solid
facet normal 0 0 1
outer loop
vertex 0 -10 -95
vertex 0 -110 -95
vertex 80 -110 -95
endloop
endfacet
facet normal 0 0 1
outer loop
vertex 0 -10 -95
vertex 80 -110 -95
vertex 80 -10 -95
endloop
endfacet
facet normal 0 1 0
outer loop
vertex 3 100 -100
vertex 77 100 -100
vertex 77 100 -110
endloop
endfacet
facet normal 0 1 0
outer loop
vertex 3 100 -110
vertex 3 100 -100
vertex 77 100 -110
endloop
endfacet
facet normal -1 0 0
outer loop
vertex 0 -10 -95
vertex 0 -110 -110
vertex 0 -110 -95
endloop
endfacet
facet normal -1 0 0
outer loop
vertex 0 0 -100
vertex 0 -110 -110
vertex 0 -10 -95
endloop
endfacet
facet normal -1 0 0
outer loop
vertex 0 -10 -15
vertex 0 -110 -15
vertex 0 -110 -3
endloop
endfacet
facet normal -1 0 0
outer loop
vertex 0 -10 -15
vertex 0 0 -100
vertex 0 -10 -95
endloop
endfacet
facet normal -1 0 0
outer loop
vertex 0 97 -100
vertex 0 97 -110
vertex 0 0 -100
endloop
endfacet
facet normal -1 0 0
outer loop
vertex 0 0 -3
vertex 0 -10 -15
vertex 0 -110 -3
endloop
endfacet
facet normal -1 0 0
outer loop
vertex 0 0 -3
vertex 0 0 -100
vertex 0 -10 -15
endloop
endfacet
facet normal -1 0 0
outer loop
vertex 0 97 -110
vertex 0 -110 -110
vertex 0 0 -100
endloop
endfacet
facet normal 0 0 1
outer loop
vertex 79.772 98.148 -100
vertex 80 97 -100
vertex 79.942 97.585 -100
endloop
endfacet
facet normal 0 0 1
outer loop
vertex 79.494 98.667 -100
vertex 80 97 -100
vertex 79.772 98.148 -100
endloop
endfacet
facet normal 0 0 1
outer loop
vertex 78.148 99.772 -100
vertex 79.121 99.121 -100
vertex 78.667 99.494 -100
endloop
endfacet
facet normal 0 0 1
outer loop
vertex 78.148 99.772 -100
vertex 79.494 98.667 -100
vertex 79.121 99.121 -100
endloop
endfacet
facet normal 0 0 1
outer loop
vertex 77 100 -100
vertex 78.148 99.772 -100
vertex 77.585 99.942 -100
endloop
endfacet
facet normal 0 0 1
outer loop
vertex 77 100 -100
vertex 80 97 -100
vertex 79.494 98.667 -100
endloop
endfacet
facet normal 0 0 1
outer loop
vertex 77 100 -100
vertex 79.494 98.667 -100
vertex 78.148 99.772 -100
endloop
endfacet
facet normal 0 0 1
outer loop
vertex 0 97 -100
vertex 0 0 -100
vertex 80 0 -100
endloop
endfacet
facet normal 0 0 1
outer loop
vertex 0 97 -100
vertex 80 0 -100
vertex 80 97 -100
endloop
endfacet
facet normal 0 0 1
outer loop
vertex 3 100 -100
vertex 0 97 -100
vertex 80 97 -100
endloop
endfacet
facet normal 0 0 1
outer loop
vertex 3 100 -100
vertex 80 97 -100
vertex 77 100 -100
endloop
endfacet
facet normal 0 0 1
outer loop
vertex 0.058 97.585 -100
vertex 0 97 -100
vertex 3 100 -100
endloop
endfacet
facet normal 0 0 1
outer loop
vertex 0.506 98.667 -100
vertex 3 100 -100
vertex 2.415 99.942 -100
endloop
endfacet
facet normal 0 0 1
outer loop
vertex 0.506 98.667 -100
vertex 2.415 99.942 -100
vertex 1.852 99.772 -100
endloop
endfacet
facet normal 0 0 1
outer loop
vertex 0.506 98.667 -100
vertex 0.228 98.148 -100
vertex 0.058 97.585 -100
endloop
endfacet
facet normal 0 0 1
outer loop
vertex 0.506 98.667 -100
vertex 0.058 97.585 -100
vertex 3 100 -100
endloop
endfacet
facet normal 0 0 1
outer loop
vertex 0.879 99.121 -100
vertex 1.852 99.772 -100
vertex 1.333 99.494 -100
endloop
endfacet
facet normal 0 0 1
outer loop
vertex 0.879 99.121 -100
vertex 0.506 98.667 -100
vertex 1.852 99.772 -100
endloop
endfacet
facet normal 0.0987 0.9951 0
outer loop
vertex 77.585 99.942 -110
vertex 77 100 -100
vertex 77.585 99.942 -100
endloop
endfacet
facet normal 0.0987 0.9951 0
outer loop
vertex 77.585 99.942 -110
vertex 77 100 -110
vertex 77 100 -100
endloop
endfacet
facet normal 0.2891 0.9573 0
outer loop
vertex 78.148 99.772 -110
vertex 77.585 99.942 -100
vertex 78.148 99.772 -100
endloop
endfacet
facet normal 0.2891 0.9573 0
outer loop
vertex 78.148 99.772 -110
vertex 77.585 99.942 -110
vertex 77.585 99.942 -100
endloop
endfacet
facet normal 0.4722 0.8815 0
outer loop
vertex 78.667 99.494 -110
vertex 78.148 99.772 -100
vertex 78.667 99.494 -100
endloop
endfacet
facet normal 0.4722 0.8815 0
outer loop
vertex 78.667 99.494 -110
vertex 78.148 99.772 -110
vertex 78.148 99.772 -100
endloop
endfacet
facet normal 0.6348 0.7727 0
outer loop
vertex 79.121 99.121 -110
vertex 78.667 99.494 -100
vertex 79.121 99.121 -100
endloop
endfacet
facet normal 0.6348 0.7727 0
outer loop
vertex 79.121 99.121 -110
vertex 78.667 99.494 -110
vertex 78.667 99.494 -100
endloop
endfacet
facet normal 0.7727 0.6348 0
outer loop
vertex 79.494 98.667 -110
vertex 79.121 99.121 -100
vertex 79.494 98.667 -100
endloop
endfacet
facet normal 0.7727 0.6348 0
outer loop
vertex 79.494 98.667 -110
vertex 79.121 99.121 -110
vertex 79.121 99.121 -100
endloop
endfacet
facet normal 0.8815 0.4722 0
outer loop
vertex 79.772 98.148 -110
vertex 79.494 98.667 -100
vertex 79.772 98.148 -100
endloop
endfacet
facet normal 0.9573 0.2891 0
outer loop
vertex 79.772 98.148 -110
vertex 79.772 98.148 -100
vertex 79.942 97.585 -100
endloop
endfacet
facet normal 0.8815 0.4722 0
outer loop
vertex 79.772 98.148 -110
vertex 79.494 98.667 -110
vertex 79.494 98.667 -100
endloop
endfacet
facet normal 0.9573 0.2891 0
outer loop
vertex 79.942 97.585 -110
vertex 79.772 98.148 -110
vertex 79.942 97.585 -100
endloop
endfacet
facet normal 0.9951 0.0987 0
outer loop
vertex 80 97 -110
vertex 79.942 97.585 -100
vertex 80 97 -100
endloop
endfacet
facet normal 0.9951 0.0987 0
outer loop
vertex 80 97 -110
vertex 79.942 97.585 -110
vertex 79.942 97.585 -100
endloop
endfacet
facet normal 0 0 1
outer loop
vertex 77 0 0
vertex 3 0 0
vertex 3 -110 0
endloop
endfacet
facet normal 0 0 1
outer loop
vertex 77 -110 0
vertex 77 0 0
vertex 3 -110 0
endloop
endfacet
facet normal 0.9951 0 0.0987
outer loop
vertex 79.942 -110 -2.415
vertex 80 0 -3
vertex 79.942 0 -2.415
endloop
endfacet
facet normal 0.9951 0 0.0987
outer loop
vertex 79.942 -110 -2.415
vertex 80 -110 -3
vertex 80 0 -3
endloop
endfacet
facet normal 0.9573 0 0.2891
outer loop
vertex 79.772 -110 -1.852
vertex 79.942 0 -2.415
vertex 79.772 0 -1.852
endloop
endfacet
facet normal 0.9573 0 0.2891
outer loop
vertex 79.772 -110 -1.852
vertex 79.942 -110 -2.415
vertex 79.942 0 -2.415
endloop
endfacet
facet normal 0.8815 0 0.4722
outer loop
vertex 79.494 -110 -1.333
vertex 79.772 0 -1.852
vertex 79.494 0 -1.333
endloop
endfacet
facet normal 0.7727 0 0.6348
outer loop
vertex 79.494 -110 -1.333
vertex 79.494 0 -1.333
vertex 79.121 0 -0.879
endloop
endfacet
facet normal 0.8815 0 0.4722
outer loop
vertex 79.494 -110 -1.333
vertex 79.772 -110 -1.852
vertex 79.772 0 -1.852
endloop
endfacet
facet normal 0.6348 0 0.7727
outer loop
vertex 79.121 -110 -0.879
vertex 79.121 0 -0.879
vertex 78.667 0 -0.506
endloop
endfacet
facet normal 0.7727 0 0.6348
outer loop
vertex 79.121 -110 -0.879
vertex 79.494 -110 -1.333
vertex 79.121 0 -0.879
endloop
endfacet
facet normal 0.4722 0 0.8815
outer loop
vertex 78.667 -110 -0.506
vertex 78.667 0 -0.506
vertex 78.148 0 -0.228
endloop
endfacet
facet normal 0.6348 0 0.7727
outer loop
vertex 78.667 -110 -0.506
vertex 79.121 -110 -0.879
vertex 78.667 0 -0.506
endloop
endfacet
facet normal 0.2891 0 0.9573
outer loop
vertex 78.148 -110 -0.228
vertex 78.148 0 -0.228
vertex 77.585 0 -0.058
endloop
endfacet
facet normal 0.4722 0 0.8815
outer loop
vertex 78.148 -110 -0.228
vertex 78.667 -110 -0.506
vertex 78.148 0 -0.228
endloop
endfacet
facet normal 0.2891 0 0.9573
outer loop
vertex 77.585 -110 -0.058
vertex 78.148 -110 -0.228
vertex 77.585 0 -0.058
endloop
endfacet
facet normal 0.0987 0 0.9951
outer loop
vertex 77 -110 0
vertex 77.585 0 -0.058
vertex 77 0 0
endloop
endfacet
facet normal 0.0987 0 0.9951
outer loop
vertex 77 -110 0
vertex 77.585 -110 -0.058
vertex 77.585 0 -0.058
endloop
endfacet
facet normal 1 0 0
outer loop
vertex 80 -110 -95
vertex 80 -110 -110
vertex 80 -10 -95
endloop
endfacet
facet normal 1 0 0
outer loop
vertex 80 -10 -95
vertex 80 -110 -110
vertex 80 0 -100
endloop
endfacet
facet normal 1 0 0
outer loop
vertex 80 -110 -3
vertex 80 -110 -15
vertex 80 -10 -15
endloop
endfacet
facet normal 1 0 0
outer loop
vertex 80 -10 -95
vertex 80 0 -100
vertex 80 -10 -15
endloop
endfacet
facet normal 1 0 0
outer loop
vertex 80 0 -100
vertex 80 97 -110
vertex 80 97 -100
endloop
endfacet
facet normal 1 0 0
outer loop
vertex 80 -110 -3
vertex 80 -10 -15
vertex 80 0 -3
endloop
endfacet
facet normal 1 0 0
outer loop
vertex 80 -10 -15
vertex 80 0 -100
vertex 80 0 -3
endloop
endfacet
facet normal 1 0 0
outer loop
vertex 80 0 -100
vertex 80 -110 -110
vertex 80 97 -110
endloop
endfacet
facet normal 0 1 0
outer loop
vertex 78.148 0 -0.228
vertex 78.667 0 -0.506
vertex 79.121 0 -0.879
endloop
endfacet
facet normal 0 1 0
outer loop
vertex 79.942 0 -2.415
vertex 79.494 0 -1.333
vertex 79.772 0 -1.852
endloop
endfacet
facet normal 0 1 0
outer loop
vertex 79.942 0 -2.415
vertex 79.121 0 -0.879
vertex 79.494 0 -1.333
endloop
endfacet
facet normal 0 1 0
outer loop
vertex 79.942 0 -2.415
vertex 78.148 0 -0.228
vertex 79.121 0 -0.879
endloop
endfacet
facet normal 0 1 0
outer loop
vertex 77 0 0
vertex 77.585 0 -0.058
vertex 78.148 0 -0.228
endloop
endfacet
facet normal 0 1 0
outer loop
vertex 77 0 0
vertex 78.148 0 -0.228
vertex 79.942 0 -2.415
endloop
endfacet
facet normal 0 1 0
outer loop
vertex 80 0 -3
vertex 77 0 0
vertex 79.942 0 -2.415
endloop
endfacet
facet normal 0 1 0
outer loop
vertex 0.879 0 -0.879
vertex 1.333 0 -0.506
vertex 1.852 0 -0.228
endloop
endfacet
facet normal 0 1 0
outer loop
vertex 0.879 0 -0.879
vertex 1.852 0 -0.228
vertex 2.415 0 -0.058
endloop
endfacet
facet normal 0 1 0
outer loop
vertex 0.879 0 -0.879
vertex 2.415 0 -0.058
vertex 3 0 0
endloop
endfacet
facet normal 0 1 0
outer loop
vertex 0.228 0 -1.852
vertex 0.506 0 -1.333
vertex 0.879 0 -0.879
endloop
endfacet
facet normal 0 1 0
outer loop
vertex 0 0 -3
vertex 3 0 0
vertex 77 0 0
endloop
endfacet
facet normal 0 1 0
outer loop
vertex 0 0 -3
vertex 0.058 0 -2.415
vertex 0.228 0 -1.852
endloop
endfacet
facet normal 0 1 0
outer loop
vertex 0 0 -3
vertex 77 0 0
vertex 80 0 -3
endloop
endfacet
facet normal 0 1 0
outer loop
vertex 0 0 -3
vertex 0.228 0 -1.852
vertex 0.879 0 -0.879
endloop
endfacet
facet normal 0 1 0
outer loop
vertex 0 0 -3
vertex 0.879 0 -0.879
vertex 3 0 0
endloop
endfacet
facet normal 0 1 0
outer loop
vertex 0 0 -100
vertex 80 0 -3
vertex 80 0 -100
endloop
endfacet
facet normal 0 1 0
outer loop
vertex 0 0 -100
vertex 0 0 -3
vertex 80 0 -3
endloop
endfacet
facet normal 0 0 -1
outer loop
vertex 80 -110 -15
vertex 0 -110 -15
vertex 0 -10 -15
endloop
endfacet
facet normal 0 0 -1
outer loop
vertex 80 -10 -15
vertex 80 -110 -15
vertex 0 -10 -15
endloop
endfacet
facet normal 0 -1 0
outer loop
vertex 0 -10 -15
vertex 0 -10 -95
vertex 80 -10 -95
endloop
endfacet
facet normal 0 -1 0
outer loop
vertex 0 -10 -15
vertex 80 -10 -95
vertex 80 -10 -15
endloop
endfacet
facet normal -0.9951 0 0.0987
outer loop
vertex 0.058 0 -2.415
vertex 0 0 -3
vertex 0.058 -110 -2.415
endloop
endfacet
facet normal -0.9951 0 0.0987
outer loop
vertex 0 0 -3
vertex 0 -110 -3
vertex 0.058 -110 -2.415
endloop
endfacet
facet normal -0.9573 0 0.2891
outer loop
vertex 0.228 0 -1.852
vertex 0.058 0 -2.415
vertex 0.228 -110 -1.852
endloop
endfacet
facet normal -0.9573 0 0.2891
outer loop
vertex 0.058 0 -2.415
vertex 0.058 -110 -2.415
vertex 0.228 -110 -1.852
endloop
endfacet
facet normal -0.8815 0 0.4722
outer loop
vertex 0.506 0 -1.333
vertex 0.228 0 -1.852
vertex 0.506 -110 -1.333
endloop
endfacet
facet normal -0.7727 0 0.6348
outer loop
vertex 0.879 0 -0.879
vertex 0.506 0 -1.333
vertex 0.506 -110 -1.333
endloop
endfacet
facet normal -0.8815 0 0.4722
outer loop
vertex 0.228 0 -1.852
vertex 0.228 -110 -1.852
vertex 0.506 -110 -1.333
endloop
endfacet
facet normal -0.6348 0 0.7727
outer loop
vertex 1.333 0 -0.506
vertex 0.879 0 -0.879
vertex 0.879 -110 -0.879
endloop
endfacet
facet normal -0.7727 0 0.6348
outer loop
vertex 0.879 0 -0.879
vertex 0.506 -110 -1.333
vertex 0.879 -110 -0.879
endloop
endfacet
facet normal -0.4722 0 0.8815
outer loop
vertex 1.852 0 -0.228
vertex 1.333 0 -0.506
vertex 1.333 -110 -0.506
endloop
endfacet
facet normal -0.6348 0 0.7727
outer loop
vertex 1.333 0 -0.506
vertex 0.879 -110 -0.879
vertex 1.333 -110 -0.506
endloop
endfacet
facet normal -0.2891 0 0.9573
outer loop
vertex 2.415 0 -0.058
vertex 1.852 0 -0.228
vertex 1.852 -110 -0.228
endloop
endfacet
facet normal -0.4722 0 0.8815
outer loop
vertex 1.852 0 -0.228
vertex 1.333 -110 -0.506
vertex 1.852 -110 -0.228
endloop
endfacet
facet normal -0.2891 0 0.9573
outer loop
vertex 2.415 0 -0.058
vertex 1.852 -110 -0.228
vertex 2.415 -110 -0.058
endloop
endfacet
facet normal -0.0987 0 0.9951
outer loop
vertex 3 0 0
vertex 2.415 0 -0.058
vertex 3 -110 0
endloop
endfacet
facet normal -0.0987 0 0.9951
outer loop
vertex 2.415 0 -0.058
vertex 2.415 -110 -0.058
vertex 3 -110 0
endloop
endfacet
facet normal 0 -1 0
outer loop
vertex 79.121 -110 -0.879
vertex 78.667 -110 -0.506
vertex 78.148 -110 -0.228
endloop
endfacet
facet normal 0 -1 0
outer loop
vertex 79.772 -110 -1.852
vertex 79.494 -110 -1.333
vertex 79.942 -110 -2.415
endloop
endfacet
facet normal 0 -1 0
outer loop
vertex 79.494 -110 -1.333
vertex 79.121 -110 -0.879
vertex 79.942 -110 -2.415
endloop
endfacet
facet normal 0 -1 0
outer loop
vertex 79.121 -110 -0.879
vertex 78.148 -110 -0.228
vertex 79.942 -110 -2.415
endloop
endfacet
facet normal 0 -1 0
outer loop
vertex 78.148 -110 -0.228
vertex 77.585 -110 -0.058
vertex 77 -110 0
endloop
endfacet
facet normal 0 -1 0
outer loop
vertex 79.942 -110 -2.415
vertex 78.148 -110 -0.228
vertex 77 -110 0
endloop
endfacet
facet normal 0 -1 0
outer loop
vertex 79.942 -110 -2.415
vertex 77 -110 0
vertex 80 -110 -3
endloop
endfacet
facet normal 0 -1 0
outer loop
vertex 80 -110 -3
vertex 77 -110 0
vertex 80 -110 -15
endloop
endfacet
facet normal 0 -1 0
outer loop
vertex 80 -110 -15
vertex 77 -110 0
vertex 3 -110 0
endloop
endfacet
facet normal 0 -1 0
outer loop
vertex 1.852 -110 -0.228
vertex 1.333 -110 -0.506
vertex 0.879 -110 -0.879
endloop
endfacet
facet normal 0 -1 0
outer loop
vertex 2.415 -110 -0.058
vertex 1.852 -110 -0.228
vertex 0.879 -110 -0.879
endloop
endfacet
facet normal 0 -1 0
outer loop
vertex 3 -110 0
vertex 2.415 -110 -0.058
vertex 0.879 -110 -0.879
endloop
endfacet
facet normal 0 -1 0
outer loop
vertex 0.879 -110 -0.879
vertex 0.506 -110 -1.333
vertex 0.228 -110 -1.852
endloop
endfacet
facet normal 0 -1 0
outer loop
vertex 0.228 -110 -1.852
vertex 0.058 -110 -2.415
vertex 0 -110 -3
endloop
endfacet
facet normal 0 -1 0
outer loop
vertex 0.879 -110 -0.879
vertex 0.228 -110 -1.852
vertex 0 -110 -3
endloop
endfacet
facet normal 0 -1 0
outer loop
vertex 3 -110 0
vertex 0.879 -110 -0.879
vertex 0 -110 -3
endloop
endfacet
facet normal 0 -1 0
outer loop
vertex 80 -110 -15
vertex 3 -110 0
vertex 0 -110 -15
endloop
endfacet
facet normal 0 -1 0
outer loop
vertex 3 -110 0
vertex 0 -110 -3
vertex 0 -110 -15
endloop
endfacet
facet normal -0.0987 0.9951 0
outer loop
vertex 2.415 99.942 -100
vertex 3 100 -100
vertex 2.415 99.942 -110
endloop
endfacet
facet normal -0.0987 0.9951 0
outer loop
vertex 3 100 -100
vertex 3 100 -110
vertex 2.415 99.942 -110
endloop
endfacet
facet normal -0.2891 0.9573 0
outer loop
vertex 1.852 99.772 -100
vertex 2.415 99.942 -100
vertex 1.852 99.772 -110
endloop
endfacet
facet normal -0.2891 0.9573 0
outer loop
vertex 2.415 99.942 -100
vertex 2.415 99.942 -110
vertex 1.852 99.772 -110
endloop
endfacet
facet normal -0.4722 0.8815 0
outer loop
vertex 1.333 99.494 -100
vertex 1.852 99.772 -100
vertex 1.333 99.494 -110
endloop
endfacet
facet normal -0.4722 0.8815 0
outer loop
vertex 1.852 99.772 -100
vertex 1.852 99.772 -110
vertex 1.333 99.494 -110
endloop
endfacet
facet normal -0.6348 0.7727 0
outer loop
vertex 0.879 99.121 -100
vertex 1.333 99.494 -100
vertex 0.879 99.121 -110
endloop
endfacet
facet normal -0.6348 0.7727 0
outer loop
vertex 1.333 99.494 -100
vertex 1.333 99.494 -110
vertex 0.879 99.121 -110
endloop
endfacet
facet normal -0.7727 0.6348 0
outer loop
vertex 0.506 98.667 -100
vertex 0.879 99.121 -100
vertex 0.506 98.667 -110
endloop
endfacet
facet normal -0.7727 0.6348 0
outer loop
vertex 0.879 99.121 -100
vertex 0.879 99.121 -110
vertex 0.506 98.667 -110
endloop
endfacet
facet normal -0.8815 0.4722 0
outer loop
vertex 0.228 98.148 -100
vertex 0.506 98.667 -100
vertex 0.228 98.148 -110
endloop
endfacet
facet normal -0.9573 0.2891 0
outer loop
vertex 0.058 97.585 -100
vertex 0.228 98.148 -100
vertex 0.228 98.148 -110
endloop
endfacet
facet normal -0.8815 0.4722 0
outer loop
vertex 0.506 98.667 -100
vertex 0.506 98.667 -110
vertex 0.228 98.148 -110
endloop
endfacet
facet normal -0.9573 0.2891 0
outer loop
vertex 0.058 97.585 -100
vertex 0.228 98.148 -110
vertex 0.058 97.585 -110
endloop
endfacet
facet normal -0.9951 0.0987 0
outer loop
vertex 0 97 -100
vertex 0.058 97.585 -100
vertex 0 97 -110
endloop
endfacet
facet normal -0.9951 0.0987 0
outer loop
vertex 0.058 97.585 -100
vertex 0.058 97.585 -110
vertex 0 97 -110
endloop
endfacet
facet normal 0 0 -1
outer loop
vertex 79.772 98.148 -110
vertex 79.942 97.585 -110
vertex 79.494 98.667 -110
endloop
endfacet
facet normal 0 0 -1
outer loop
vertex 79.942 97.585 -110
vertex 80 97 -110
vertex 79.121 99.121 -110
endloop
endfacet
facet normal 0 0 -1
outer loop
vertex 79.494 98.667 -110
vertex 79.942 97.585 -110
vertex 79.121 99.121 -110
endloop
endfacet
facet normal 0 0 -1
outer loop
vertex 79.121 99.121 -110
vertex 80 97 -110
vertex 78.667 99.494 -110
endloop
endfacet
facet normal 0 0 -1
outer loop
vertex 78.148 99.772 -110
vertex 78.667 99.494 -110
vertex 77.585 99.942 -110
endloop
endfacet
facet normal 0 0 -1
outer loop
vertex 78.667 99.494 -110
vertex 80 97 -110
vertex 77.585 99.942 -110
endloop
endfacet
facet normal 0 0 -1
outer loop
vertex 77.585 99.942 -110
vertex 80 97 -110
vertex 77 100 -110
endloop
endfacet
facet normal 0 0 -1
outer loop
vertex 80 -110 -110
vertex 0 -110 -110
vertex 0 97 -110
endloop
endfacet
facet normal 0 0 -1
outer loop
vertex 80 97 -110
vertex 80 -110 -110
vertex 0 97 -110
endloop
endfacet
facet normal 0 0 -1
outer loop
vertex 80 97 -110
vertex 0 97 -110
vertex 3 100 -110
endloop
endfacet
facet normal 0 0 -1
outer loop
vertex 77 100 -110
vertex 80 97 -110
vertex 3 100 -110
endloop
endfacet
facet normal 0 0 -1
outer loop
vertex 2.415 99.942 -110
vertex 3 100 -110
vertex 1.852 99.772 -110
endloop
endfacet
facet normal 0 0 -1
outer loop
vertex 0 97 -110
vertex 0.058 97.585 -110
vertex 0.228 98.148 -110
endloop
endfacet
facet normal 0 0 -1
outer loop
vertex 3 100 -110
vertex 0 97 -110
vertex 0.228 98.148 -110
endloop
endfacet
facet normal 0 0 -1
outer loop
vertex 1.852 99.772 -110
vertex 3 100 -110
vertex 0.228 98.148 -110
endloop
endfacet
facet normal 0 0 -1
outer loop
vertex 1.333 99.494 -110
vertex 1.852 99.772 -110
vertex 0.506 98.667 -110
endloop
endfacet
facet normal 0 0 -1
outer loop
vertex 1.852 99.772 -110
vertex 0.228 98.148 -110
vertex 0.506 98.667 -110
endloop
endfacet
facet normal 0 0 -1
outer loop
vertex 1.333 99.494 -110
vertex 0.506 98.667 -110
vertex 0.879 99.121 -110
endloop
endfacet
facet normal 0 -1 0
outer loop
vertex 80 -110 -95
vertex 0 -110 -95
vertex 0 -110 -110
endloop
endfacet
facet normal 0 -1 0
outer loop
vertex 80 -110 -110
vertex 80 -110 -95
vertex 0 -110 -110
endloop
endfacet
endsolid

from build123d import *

# Parameters (mm, degrees)
SKETCH_1_W      = 15
SKETCH_1_H      = 100
EXTRUDE_1_DEPTH = 80
FILLET_1_R      = 3
FILLET_2_R      = 3


with BuildPart() as part:
    # 스케치1 → 보스-돌출1 (new body)
    with BuildSketch(Plane(origin=(0, 0, 0), x_dir=(0, 0, -1), z_dir=(1, 0, 0))):
        Polygon((0, -10), (0, 0), (100, 0), (100, 100), (110, 100), (110, -10), align=None)
        with Locations((102.5, -60)):
            Rectangle(SKETCH_1_W, SKETCH_1_H)
        with Locations((7.5, -60)):
            Rectangle(SKETCH_1_W, SKETCH_1_H)
    extrude(amount=EXTRUDE_1_DEPTH)

    # 필렛1
    fillet_1_edges = [part.edges().sort_by_distance(p)[0] for p in [
        (0, 100, -105),
        (80, 100, -105),
    ]]
    fillet(fillet_1_edges, radius=FILLET_1_R)

    # 필렛2
    fillet_2_edges = [part.edges().sort_by_distance(p)[0] for p in [
        (0, -55, 0),
        (80, -55, 0),
    ]]
    fillet(fillet_2_edges, radius=FILLET_2_R)


solid = part.part
